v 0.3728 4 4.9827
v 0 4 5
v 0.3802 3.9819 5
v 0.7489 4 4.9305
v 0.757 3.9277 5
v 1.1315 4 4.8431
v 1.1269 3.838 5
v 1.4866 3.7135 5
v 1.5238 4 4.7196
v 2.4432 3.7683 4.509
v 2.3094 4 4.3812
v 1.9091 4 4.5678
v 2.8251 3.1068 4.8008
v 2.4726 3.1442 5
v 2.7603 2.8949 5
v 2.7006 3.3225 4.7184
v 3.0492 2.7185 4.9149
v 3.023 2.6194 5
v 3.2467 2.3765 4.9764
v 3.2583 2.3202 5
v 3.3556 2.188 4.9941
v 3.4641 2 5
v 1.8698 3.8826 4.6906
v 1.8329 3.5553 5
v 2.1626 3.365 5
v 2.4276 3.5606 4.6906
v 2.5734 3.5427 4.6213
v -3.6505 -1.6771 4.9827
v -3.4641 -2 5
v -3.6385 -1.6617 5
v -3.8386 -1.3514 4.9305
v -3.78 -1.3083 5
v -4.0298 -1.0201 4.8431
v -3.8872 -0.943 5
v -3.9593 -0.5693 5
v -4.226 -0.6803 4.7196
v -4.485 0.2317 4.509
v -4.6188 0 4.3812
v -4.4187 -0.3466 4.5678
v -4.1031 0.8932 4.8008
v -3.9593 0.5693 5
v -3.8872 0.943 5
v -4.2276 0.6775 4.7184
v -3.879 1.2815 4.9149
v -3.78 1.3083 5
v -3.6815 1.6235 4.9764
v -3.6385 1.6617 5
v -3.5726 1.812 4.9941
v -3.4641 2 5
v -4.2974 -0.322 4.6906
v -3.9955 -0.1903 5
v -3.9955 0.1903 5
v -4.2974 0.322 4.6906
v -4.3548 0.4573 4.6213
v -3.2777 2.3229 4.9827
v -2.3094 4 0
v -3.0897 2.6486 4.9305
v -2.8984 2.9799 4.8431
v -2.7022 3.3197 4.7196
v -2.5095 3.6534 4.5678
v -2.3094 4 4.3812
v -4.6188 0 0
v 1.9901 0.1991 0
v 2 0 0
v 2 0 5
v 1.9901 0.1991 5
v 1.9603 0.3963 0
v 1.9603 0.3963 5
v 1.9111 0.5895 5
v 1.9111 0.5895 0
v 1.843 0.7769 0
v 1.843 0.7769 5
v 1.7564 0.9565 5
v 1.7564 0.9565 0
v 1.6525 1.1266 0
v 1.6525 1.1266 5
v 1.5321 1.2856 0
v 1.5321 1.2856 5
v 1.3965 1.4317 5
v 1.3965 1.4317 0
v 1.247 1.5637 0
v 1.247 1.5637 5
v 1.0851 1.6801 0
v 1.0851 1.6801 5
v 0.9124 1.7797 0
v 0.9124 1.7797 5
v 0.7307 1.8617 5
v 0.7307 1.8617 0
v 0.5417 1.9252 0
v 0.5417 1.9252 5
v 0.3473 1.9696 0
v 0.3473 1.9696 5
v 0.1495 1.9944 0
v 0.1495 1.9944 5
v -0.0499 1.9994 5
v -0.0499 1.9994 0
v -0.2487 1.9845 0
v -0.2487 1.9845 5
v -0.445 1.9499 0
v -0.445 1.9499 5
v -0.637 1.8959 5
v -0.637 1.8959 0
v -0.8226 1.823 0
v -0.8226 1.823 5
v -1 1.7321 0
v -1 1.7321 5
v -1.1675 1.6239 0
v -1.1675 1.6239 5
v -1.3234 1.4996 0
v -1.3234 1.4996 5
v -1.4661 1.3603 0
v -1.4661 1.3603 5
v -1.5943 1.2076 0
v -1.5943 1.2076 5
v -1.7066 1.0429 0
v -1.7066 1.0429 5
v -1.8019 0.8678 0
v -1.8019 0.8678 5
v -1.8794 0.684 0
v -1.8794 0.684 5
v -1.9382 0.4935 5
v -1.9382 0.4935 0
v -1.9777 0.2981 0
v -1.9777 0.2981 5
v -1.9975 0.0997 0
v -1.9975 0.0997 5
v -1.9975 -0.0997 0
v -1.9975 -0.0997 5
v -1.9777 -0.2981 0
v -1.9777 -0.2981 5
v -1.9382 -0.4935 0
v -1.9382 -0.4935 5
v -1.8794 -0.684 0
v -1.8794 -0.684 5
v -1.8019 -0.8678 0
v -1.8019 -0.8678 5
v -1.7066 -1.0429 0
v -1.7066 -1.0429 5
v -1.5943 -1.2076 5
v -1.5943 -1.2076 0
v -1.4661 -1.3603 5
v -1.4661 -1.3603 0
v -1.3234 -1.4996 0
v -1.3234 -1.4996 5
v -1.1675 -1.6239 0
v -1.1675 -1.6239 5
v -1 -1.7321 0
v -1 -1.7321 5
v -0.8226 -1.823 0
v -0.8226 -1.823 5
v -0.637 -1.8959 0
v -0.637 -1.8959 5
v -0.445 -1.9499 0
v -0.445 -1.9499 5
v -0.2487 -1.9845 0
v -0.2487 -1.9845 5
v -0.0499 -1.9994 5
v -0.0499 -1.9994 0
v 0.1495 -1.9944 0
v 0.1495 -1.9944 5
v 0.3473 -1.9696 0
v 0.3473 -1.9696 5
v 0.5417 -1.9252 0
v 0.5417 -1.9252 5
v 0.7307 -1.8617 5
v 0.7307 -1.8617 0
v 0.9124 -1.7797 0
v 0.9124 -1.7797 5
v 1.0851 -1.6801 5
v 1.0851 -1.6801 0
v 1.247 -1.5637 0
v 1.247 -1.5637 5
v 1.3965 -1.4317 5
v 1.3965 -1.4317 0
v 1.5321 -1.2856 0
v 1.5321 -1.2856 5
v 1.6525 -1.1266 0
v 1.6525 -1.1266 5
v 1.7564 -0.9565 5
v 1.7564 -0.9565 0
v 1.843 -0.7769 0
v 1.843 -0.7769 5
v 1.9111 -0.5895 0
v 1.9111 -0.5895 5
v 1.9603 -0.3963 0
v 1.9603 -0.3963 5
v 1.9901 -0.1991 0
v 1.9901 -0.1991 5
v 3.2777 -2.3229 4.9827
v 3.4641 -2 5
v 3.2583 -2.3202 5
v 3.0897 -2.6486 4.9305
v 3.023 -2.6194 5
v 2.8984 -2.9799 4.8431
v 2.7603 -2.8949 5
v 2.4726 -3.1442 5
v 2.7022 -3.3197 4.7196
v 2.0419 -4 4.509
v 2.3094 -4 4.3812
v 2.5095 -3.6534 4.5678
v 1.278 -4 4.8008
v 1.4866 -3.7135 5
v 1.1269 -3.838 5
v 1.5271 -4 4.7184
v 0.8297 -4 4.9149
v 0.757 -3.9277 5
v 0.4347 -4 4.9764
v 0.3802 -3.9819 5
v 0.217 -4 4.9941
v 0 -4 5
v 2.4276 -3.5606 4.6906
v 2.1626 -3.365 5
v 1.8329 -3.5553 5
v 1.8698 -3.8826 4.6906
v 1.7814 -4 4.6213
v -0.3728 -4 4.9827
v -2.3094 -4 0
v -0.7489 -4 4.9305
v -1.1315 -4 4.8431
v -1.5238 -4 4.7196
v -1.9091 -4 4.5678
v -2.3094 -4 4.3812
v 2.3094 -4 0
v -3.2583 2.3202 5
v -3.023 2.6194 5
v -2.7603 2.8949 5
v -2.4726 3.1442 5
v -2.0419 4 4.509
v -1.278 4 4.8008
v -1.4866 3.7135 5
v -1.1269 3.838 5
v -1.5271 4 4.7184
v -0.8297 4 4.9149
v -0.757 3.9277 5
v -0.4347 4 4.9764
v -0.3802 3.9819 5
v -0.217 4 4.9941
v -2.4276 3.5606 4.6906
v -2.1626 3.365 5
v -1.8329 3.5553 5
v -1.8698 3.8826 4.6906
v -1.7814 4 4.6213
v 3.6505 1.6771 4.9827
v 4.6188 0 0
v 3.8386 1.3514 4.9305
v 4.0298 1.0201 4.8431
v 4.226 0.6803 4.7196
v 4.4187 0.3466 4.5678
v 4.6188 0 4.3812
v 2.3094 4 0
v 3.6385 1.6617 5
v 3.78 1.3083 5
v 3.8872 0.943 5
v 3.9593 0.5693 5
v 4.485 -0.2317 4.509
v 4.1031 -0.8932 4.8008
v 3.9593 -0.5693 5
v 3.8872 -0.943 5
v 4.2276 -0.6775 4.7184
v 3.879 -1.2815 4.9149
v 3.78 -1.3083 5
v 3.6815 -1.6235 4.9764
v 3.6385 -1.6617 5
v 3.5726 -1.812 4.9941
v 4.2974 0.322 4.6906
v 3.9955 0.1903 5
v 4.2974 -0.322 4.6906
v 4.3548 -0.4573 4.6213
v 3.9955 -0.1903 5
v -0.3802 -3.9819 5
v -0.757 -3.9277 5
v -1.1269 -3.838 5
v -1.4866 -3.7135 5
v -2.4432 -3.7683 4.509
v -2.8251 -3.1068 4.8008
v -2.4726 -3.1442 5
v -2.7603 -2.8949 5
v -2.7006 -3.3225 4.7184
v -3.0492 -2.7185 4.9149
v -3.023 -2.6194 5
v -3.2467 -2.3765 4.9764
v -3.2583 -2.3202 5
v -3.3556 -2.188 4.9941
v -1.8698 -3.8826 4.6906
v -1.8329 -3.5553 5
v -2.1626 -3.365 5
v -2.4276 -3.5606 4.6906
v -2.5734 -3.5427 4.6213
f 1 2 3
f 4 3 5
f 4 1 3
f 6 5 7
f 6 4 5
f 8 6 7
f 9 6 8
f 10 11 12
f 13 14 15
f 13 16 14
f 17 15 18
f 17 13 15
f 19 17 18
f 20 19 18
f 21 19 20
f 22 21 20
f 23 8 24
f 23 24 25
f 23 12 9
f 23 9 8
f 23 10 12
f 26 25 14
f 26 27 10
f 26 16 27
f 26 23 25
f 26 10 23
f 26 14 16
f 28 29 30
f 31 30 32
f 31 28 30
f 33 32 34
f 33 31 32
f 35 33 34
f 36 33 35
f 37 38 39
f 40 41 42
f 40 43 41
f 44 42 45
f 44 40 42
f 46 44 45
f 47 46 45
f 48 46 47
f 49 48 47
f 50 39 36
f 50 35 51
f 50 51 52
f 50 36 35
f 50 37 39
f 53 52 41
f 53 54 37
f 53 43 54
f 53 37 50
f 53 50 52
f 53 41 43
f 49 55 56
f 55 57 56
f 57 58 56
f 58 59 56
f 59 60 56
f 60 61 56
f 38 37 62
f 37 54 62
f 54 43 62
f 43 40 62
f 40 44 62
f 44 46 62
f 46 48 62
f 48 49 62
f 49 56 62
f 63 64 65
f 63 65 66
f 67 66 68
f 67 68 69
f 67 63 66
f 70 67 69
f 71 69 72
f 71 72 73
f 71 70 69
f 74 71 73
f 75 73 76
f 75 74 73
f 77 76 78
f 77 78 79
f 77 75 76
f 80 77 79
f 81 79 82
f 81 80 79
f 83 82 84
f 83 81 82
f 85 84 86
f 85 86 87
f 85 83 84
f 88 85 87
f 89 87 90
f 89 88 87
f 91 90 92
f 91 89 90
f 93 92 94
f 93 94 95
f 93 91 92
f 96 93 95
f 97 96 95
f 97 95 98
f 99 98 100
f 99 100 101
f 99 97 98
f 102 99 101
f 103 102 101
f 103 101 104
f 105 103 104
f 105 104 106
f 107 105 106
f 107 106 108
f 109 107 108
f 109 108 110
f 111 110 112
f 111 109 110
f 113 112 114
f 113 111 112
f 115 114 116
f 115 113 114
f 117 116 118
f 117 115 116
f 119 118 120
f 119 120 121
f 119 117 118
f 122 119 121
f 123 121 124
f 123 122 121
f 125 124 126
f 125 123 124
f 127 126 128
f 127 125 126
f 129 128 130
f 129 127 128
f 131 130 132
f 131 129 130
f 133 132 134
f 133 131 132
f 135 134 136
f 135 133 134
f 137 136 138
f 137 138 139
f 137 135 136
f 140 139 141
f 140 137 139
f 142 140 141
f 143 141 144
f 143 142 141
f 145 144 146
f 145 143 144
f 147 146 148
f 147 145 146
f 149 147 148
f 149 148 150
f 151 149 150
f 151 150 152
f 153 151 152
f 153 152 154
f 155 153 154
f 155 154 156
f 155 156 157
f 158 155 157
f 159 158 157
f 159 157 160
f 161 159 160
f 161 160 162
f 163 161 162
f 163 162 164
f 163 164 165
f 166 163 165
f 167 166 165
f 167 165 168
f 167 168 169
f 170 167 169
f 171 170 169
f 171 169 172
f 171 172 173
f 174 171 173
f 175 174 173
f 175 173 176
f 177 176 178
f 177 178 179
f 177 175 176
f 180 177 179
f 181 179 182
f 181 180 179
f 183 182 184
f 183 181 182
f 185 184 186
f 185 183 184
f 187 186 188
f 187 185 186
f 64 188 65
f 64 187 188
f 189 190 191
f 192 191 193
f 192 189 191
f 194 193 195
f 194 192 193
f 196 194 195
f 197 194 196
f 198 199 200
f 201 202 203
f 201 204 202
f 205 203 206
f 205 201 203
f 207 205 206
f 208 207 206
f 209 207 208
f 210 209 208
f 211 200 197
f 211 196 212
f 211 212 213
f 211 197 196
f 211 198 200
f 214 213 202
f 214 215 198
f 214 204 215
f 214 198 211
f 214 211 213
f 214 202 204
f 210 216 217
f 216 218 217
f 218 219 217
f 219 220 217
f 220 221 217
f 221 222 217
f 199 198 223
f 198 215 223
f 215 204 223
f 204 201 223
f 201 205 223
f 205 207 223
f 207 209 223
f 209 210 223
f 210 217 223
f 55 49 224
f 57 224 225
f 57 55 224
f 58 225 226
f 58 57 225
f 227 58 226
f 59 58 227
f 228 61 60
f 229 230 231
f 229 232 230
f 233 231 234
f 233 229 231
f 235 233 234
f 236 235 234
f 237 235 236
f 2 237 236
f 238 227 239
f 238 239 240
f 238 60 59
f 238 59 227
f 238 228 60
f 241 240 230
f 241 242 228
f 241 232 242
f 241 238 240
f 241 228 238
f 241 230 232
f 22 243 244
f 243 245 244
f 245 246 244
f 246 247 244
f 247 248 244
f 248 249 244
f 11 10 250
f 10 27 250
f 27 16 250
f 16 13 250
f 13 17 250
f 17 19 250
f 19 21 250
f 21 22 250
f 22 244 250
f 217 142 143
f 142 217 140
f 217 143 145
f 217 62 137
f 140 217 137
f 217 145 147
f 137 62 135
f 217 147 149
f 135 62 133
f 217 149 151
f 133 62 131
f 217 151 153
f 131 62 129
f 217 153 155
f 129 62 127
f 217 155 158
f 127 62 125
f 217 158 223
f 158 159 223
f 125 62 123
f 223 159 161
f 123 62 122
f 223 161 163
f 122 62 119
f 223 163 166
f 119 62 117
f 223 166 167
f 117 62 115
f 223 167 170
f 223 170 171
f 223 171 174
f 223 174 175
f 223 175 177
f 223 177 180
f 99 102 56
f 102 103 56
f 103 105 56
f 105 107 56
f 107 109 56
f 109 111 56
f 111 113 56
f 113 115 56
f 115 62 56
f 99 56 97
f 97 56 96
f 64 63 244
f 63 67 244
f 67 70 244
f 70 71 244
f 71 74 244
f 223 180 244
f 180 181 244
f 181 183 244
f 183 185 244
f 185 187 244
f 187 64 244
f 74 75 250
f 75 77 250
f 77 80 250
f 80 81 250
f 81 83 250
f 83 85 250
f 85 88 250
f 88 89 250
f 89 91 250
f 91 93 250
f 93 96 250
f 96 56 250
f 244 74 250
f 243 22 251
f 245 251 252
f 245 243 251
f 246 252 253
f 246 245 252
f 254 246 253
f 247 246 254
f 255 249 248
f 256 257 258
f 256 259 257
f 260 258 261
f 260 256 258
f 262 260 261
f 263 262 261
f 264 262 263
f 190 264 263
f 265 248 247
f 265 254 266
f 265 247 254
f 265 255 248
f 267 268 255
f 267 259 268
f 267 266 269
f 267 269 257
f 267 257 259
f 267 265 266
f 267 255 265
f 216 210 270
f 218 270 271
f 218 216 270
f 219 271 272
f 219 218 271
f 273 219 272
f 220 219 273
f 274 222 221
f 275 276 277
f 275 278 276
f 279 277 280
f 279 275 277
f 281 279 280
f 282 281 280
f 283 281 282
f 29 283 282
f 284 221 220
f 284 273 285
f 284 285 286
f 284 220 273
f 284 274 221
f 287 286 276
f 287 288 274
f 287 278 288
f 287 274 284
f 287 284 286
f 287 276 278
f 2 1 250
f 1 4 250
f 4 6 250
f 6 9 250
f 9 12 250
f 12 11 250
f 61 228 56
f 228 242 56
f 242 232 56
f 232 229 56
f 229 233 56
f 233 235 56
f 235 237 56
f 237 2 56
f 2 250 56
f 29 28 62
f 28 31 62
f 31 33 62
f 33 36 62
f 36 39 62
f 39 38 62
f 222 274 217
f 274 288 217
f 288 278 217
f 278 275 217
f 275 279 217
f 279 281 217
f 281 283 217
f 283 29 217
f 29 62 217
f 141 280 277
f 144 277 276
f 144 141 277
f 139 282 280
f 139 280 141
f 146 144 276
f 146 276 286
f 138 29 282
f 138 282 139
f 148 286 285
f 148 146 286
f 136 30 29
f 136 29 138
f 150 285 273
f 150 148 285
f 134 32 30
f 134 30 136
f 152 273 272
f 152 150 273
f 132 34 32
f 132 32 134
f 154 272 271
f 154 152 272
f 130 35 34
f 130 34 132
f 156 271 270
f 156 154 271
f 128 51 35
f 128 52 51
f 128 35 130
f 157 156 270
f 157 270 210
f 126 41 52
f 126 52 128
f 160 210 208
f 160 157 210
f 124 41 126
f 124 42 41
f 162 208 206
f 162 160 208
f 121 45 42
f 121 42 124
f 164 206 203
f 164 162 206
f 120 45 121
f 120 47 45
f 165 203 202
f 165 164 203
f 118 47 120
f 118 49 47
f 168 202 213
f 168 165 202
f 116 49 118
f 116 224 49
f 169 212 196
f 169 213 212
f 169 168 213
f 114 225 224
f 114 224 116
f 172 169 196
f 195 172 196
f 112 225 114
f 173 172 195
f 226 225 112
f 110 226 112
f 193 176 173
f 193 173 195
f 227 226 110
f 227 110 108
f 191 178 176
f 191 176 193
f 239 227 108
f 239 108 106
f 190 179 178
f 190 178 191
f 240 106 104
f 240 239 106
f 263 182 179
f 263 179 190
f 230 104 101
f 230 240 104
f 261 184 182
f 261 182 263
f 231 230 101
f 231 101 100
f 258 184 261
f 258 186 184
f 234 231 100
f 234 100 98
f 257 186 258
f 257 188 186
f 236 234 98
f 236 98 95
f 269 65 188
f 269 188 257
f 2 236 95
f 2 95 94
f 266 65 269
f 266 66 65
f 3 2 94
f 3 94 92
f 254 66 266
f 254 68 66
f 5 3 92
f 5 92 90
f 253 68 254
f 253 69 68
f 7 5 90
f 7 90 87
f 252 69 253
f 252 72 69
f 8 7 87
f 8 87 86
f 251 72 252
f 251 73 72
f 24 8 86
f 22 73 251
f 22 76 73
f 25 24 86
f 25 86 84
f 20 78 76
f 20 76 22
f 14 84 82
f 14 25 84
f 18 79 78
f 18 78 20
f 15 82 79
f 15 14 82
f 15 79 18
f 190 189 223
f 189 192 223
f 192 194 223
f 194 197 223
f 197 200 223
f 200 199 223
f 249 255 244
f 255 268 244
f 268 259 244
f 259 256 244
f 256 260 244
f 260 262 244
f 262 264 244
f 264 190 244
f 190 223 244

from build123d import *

# Parameters (mm, degrees)
ESBO_O1_R                = 2
RESSALTO_EXTRUS_O1_DEPTH = 5
ESBO_O2_R                = 7.750187391
ESBO_O2_R_2              = 4
CORTE_EXTRUS_O1_DEPTH    = 1
CORTE_EXTRUS_O1_TAPER    = 45


with BuildPart() as part:
    # Esboço1 → Ressalto-extrusão1 (new body)
    with BuildSketch(Plane.XY):
        Polygon((2.309401077, -4), (4.618802154, 0), (2.309401077, 4), (-2.309401077, 4), (-4.618802154, 0), (-2.309401077, -4), align=None)
        Circle(ESBO_O1_R, mode=Mode.SUBTRACT)
    extrude(amount=RESSALTO_EXTRUS_O1_DEPTH)

    # Esboço2 → Corte-extrusão1 (cut)
    with BuildSketch(Plane.XY.offset(5)):
        Circle(ESBO_O2_R)
        Circle(ESBO_O2_R_2, mode=Mode.SUBTRACT)
    extrude(amount=-CORTE_EXTRUS_O1_DEPTH, taper=CORTE_EXTRUS_O1_TAPER, mode=Mode.SUBTRACT)


solid = part.part
